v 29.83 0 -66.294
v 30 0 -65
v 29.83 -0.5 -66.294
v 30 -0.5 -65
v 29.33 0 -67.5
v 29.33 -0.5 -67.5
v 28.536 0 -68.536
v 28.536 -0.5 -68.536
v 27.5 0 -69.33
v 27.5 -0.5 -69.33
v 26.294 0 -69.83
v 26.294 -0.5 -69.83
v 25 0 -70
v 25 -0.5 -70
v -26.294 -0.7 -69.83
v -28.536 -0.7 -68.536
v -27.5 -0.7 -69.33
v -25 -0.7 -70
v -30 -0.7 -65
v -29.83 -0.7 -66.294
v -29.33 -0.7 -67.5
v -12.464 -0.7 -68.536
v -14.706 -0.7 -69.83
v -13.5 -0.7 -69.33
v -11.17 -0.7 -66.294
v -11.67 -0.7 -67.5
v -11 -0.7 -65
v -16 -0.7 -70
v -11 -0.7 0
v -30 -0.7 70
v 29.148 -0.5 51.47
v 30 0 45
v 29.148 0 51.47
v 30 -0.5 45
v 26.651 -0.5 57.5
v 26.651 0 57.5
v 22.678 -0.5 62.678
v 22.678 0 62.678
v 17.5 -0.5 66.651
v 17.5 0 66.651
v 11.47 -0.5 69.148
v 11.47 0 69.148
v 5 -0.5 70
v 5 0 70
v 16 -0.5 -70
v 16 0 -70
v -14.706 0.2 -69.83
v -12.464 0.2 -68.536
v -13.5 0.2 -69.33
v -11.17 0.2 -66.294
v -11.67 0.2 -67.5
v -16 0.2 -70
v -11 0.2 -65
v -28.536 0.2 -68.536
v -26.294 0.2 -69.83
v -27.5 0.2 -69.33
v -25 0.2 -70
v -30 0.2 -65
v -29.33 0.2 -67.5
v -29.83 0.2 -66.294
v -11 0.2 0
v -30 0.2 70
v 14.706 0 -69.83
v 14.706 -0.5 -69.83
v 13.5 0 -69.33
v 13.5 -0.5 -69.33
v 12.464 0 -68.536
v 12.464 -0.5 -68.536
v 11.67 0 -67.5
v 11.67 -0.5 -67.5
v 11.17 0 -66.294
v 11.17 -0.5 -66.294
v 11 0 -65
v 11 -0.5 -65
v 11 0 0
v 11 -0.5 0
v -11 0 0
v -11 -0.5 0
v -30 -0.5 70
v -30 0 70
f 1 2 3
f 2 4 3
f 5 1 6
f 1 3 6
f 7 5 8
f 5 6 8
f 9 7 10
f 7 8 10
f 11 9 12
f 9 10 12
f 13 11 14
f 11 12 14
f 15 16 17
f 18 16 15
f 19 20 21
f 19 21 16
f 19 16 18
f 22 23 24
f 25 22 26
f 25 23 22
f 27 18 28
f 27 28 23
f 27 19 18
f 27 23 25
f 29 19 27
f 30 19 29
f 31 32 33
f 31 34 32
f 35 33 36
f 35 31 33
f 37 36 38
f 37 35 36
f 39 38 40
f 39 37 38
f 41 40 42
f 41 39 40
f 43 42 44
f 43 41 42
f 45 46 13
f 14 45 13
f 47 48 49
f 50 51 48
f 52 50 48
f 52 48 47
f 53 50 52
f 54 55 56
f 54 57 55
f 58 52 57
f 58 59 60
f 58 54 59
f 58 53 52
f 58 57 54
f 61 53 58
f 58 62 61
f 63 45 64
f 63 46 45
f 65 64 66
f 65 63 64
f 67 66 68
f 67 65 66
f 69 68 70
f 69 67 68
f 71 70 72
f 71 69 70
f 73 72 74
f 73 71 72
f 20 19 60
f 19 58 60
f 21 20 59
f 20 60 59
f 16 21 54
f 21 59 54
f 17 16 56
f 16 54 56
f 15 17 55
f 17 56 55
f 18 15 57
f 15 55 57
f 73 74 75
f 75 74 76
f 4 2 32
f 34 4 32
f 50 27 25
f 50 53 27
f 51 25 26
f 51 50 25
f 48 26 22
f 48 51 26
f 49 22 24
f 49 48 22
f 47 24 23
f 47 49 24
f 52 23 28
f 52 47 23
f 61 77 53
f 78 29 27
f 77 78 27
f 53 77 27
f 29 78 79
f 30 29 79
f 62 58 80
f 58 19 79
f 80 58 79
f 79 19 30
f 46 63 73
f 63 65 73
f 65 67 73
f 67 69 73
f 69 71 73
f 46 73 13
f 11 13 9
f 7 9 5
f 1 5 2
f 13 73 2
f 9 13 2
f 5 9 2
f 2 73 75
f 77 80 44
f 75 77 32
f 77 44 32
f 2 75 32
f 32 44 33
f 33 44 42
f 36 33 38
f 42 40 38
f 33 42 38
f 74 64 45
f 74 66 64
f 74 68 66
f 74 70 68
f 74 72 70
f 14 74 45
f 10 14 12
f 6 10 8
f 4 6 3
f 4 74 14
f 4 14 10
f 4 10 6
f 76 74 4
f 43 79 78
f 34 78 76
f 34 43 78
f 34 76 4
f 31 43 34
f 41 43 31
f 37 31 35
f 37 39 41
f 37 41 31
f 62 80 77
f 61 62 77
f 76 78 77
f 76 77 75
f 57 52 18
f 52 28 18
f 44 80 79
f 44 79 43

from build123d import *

# Parameters (mm, degrees)
F0_W     = 60
F0_H     = 140
F1_DEPTH = 0.5
F2_W     = 22
F2_H     = 70
F3_DEPTH = 0.5
F5_DEPTH = 0.2
F7_DEPTH = 0.2
F8_R     = 25
F9_R     = 5


with BuildPart() as f1:
    # F0 (on Front) → F1 (new body)
    with BuildSketch(Plane.XZ):
        Rectangle(F0_W, F0_H)
    extrude(amount=F1_DEPTH)

    # F2 (on face) → F3 (cut, through all)
    with BuildSketch(Plane.XZ.offset(0.5)):
        with Locations((0, -35)):
            Rectangle(F2_W, F2_H)
    extrude(amount=-F3_DEPTH, mode=Mode.SUBTRACT)

    # F4 (on face) → F5 (join)
    with BuildSketch(Plane.XZ.offset(0.5)):
        Polygon((-30, 70), (-30, -70), (-11, -70), (-11, 0), align=None)
    extrude(amount=F5_DEPTH)

    # F6 (on face) → F7 (join)
    with BuildSketch(Plane(origin=(0, 0, 0), x_dir=(-1, 0, 0), z_dir=(0, 1, 0))):
        Polygon((11, 0), (11, -70), (30, -70), (30, 70), align=None)
    extrude(amount=F7_DEPTH)

    # F8
    f8_edges = [f1.edges().sort_by_distance(p)[0] for p in [
        (30, -0.25, 70),
    ]]
    fillet(f8_edges, radius=F8_R)

    # F9
    f9_edges = [f1.edges().sort_by_distance(p)[0] for p in [
        (-30, -0.25, -70),
        (-11, -0.25, -70),
        (11, -0.25, -70),
        (30, -0.25, -70),
    ]]
    fillet(f9_edges, radius=F9_R)


solid = f1.part
